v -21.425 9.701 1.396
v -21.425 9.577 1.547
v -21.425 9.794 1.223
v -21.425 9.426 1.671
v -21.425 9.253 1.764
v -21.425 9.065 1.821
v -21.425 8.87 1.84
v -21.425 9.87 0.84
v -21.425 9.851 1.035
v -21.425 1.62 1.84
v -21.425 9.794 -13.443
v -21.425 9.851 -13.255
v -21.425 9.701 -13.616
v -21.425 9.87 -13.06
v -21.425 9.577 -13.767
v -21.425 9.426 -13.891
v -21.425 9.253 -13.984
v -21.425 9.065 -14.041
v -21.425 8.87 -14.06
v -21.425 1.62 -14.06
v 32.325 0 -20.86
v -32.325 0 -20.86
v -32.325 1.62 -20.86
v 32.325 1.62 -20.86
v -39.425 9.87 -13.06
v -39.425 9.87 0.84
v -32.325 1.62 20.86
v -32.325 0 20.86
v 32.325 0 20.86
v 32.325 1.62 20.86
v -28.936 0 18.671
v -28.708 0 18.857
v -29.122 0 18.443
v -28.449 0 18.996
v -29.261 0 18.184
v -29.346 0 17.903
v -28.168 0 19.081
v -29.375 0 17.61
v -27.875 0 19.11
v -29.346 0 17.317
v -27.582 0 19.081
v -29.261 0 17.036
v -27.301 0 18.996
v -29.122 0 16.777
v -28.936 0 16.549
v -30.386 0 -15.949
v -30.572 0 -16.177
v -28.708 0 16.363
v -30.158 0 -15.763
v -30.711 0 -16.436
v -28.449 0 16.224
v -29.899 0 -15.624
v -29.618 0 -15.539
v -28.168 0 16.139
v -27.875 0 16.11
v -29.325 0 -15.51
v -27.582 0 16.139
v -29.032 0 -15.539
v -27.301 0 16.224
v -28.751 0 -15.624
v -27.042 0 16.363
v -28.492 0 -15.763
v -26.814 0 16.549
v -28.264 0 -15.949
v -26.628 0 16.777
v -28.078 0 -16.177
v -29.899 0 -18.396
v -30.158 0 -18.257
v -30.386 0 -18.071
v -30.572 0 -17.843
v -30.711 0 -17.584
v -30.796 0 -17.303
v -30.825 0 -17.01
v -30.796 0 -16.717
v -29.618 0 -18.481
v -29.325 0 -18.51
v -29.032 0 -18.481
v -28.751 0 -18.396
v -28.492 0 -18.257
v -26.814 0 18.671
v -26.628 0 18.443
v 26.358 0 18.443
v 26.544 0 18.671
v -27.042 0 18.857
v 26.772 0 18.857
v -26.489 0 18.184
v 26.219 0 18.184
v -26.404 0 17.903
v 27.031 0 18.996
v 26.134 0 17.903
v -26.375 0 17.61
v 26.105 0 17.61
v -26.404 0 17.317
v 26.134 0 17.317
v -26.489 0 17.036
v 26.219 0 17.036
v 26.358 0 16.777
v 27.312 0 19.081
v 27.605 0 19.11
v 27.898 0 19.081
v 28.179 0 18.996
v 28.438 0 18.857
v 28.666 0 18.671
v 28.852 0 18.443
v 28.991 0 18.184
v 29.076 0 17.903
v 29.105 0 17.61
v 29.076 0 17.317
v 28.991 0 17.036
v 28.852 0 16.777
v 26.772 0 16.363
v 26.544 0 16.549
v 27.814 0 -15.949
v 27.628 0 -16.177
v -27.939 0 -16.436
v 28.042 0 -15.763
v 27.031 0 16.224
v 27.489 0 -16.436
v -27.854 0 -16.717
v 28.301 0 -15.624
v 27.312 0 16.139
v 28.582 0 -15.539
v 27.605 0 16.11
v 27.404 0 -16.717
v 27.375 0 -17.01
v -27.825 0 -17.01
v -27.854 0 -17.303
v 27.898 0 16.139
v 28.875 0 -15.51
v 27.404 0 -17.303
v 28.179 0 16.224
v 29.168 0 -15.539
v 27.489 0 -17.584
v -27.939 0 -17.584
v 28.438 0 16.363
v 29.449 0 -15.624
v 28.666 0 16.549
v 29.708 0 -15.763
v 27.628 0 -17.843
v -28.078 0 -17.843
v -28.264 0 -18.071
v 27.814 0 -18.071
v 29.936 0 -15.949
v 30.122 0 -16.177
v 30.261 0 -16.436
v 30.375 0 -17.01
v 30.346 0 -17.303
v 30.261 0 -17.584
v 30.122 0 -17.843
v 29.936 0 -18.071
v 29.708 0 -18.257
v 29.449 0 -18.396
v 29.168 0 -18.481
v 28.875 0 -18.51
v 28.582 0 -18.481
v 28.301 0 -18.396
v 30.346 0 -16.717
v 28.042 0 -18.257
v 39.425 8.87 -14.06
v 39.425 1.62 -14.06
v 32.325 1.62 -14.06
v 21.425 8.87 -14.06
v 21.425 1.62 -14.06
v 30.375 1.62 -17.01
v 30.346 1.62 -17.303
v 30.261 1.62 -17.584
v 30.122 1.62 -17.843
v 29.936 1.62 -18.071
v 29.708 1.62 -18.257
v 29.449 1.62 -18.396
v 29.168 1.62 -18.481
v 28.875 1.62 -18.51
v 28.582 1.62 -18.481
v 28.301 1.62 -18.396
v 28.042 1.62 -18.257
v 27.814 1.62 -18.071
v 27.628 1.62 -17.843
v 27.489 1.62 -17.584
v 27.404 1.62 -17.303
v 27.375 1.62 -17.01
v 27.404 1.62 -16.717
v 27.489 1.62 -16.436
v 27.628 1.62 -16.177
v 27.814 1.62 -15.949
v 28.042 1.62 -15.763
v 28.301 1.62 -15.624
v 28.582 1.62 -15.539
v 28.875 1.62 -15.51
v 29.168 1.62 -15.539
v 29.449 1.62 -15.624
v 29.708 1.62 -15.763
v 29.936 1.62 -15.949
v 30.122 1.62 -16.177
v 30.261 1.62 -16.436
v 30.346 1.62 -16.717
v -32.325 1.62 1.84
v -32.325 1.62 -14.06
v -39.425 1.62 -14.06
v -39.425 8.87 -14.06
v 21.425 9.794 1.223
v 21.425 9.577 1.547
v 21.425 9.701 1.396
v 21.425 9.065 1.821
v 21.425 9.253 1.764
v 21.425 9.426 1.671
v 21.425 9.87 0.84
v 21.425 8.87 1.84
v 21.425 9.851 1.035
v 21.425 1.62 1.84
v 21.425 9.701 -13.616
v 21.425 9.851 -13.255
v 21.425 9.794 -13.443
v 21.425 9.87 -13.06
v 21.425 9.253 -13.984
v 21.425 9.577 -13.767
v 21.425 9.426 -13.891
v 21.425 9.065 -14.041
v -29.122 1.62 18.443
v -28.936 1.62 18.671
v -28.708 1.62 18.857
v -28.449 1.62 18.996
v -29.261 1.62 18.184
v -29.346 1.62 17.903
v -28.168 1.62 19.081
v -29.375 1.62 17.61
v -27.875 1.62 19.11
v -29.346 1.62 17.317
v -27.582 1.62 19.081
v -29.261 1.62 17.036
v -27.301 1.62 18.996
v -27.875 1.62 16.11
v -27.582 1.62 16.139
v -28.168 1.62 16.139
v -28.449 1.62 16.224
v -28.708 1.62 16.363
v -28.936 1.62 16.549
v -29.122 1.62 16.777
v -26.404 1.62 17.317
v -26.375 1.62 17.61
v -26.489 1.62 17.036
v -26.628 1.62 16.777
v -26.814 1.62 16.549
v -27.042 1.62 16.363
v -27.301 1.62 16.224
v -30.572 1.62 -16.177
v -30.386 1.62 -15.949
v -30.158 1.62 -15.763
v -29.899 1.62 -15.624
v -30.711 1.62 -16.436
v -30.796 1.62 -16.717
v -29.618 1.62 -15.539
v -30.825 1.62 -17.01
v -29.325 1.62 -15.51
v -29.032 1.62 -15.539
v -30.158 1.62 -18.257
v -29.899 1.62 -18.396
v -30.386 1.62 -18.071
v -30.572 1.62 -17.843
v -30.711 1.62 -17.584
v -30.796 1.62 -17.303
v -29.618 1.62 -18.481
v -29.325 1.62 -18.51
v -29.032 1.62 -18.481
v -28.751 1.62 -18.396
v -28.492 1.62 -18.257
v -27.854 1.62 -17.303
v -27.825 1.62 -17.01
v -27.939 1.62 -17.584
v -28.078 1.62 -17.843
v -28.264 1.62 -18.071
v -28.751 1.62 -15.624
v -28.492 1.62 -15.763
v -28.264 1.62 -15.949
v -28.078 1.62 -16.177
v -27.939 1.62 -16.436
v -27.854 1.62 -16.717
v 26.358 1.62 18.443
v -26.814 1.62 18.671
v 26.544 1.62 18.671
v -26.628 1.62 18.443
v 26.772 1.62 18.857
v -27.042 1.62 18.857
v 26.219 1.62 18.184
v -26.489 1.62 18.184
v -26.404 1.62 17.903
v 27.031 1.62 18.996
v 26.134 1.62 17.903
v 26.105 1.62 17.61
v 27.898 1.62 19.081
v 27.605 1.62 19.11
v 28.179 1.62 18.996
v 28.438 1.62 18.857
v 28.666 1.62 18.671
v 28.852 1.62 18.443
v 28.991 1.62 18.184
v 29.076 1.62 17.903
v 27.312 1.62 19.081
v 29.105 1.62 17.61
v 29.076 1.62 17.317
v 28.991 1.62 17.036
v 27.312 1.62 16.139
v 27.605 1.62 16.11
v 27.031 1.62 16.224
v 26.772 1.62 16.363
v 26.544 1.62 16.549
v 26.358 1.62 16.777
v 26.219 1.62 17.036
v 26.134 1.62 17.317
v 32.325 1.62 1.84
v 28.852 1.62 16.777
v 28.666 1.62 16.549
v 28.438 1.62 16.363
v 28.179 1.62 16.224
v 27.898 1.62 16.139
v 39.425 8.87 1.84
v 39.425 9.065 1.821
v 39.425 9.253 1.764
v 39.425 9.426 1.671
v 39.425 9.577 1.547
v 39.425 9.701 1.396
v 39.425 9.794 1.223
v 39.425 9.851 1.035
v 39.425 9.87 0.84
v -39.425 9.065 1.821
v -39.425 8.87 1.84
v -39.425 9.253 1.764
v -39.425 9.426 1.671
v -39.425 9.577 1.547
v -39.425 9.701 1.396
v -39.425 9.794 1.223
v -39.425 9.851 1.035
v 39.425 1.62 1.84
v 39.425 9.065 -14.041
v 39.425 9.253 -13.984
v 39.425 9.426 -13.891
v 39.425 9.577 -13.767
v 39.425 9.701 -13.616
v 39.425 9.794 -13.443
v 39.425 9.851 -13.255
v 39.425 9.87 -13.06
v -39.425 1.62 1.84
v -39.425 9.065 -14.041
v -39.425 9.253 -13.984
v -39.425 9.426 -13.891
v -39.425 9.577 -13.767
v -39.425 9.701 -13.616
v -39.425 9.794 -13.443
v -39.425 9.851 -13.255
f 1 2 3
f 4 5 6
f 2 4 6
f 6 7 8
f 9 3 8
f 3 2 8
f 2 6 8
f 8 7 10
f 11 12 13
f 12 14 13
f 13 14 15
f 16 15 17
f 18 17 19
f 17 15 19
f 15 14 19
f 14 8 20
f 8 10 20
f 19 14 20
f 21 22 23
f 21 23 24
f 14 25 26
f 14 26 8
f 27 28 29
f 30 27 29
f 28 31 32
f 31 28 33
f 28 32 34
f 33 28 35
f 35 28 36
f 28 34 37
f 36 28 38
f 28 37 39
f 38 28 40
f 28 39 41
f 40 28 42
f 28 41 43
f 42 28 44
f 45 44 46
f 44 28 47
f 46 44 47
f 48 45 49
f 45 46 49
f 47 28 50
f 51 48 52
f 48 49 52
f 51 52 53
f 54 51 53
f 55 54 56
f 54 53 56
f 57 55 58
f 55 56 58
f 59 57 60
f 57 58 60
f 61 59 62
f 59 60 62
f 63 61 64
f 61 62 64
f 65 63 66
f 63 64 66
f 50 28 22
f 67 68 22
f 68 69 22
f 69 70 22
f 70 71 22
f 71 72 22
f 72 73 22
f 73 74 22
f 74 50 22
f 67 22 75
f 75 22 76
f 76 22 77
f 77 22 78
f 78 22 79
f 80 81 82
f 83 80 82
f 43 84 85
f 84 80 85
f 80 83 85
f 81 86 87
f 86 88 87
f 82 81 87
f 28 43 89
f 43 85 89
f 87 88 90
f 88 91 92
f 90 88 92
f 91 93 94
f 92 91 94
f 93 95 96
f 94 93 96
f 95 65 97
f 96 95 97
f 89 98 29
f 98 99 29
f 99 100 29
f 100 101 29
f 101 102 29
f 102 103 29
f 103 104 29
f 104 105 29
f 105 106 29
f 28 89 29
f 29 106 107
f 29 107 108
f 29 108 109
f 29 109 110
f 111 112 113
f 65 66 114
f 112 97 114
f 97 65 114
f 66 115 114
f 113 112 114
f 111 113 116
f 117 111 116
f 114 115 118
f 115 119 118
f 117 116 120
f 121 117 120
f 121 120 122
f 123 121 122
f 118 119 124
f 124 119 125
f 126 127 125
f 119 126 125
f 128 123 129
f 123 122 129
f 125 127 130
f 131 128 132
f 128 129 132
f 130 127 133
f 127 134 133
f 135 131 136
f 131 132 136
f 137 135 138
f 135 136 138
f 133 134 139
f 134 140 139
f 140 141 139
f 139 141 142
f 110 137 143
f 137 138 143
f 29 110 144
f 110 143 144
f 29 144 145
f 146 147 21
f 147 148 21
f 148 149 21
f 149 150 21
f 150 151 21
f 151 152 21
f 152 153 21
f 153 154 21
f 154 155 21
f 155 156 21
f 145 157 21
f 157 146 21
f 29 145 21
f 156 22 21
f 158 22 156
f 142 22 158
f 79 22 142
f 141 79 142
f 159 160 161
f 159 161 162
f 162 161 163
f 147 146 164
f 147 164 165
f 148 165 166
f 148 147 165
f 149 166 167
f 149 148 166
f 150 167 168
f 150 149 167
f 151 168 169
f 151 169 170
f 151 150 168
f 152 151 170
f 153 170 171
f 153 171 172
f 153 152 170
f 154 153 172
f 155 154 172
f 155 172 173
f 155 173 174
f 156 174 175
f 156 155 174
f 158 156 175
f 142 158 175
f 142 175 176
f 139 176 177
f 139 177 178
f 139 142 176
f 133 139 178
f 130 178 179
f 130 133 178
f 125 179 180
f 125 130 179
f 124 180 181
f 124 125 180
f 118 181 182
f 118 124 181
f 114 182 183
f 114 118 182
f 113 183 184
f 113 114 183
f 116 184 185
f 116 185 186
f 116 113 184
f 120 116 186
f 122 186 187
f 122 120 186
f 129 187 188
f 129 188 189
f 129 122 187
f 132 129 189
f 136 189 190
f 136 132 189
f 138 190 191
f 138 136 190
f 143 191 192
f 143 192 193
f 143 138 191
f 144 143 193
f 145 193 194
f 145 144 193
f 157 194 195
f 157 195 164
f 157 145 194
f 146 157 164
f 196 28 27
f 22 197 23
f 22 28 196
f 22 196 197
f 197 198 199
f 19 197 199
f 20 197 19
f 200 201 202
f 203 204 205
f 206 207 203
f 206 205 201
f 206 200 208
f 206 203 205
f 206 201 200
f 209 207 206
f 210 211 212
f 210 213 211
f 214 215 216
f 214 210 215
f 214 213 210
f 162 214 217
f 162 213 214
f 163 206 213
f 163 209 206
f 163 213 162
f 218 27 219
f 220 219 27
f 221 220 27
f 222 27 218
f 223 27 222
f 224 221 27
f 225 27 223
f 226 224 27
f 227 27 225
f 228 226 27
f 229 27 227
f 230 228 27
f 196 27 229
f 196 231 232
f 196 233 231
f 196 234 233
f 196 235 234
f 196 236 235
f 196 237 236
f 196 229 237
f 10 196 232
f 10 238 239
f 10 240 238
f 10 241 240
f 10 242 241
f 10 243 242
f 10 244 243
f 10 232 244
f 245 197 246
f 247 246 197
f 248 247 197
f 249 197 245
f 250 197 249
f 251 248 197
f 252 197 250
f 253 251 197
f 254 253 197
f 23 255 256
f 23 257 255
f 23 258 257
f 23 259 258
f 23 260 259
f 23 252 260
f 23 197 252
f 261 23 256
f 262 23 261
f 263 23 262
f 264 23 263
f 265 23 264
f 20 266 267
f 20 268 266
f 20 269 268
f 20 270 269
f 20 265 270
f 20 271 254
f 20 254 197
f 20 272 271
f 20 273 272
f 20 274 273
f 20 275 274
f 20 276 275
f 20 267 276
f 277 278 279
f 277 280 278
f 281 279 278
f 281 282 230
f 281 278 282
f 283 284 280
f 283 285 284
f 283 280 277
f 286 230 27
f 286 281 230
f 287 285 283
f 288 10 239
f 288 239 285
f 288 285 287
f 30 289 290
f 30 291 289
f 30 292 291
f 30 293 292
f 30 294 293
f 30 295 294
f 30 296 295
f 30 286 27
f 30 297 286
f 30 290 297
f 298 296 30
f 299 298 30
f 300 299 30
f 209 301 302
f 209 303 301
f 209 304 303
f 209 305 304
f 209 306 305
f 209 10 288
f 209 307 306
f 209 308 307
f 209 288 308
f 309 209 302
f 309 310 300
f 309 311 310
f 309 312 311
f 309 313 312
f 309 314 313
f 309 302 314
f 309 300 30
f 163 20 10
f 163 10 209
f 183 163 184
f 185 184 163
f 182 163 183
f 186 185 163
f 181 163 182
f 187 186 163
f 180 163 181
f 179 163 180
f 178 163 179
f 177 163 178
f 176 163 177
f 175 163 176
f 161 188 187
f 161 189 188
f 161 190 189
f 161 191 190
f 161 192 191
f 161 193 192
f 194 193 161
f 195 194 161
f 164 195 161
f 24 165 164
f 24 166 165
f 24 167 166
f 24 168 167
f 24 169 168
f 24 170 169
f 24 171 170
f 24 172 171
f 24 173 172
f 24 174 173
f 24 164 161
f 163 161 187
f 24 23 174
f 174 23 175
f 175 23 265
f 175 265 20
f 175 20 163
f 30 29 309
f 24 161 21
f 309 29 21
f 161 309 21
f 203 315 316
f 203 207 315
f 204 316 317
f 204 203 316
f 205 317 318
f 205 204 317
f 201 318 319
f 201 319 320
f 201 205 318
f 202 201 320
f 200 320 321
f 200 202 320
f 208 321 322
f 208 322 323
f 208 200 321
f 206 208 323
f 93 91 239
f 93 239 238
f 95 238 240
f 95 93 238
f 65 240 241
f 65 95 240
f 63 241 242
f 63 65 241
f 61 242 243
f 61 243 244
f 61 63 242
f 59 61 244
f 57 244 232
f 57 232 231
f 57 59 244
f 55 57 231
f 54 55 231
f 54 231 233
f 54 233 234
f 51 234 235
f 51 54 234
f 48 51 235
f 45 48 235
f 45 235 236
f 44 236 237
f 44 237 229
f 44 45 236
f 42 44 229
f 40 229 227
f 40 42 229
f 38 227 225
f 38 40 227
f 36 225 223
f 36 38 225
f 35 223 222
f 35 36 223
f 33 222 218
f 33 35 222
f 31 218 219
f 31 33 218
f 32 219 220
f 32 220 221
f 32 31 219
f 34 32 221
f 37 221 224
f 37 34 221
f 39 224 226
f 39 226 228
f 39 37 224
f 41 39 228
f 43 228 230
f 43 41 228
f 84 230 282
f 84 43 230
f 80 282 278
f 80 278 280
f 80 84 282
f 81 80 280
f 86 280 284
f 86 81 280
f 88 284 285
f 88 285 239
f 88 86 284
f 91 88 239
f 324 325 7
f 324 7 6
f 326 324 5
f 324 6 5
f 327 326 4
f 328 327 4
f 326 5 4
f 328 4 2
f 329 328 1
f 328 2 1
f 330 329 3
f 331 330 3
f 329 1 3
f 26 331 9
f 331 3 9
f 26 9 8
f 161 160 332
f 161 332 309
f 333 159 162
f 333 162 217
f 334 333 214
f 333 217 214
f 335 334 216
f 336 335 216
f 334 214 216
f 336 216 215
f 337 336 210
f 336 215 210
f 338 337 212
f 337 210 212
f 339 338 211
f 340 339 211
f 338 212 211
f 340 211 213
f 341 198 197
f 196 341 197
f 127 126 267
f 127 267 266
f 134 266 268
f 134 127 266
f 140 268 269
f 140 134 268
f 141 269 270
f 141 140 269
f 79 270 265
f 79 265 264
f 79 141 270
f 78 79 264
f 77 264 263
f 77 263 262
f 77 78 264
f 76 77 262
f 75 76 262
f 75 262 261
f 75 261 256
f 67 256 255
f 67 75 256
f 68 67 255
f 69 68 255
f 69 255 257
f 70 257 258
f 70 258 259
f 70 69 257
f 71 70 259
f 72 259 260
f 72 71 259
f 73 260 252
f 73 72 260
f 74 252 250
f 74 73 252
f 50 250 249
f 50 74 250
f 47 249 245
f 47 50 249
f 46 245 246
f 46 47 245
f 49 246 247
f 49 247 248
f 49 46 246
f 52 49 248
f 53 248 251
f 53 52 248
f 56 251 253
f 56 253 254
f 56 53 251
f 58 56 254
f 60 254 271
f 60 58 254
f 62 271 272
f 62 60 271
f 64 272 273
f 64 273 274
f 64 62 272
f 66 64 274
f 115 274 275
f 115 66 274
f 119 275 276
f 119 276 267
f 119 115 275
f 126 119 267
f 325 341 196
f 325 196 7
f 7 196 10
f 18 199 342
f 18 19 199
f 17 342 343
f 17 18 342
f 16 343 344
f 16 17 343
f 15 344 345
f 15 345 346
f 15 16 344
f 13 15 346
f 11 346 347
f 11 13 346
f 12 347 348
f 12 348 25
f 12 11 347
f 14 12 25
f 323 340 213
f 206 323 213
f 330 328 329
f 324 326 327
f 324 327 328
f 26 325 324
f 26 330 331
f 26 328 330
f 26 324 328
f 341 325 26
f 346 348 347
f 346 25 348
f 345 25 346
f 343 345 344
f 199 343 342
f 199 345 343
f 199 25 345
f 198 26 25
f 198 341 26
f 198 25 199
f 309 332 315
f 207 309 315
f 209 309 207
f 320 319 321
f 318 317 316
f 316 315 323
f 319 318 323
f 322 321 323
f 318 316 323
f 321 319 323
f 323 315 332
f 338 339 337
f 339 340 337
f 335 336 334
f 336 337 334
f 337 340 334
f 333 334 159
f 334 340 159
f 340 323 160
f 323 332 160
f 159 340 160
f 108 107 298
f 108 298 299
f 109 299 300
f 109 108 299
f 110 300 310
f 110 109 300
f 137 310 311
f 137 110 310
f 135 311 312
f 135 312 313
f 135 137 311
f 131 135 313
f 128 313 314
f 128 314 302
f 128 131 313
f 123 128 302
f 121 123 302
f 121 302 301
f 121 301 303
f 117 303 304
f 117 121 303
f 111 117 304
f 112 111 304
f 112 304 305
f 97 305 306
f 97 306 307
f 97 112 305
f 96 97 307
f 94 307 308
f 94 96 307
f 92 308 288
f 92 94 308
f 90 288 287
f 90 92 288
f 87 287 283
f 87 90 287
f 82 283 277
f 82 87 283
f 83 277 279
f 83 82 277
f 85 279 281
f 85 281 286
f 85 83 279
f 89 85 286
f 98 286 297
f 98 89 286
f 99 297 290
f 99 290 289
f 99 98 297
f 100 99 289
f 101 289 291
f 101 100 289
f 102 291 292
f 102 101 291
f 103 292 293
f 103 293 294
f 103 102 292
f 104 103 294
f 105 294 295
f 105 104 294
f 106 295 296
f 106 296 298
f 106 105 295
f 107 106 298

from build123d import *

# Parameters (mm, degrees)
SKETCH1_W            = 64.65
SKETCH1_H            = 41.72
SKETCH1_R            = 1.5
BOSS_EXTRUDE1_DEPTH  = 1.62
SKETCH2_W            = 18
SKETCH2_H            = 15.9
BOSS_EXTRUDE2_DEPTH  = 8.25
FILLET1_R            = 1
FILLET1_OF_MIRROR1_R = 1


with BuildPart() as part:
    # Sketch1 → Boss-Extrude1 (new body)
    with BuildSketch(Plane(origin=(0, 0, 0), x_dir=(1, 0, 0), z_dir=(0, 1, 0))):
        Rectangle(SKETCH1_W, SKETCH1_H)
        with Locations((27.605, -17.61)):
            Circle(SKETCH1_R, mode=Mode.SUBTRACT)
        with Locations((-27.875, -17.61)):
            Circle(SKETCH1_R, mode=Mode.SUBTRACT)
        with Locations((28.875, 17.01)):
            Circle(SKETCH1_R, mode=Mode.SUBTRACT)
        with Locations((-29.325, 17.01)):
            Circle(SKETCH1_R, mode=Mode.SUBTRACT)
    extrude(amount=BOSS_EXTRUDE1_DEPTH)

    # Sketch2 → Boss-Extrude2 (add)
    with BuildSketch(Plane(origin=(0, 1.62, 0), x_dir=(1, 0, 0), z_dir=(0, 1, 0))):
        with Locations((-30.425, 6.11)):
            Rectangle(SKETCH2_W, SKETCH2_H)
    boss_extrude2 = extrude(amount=BOSS_EXTRUDE2_DEPTH)

    # Fillet1
    fillet1_edges = [part.edges().sort_by_distance(p)[0] for p in [
        (-30.425, 9.87, -14.06),
        (-30.425, 9.87, 1.84),
    ]]
    fillet(fillet1_edges, radius=FILLET1_R)

    # Mirror1: Boss-Extrude2 across plane
    add(boss_extrude2.mirror(Plane(origin=(0, 0, 0), x_dir=(0, 0, 1), z_dir=(1, 0, 0))))

    # Fillet1 of Mirror1
    fillet1_of_mirror1_edges = [part.edges().sort_by_distance(p)[0] for p in [
        (30.425, 9.87, -14.06),
        (30.425, 9.87, 1.84),
    ]]
    fillet(fillet1_of_mirror1_edges, radius=FILLET1_OF_MIRROR1_R)


solid = part.part
